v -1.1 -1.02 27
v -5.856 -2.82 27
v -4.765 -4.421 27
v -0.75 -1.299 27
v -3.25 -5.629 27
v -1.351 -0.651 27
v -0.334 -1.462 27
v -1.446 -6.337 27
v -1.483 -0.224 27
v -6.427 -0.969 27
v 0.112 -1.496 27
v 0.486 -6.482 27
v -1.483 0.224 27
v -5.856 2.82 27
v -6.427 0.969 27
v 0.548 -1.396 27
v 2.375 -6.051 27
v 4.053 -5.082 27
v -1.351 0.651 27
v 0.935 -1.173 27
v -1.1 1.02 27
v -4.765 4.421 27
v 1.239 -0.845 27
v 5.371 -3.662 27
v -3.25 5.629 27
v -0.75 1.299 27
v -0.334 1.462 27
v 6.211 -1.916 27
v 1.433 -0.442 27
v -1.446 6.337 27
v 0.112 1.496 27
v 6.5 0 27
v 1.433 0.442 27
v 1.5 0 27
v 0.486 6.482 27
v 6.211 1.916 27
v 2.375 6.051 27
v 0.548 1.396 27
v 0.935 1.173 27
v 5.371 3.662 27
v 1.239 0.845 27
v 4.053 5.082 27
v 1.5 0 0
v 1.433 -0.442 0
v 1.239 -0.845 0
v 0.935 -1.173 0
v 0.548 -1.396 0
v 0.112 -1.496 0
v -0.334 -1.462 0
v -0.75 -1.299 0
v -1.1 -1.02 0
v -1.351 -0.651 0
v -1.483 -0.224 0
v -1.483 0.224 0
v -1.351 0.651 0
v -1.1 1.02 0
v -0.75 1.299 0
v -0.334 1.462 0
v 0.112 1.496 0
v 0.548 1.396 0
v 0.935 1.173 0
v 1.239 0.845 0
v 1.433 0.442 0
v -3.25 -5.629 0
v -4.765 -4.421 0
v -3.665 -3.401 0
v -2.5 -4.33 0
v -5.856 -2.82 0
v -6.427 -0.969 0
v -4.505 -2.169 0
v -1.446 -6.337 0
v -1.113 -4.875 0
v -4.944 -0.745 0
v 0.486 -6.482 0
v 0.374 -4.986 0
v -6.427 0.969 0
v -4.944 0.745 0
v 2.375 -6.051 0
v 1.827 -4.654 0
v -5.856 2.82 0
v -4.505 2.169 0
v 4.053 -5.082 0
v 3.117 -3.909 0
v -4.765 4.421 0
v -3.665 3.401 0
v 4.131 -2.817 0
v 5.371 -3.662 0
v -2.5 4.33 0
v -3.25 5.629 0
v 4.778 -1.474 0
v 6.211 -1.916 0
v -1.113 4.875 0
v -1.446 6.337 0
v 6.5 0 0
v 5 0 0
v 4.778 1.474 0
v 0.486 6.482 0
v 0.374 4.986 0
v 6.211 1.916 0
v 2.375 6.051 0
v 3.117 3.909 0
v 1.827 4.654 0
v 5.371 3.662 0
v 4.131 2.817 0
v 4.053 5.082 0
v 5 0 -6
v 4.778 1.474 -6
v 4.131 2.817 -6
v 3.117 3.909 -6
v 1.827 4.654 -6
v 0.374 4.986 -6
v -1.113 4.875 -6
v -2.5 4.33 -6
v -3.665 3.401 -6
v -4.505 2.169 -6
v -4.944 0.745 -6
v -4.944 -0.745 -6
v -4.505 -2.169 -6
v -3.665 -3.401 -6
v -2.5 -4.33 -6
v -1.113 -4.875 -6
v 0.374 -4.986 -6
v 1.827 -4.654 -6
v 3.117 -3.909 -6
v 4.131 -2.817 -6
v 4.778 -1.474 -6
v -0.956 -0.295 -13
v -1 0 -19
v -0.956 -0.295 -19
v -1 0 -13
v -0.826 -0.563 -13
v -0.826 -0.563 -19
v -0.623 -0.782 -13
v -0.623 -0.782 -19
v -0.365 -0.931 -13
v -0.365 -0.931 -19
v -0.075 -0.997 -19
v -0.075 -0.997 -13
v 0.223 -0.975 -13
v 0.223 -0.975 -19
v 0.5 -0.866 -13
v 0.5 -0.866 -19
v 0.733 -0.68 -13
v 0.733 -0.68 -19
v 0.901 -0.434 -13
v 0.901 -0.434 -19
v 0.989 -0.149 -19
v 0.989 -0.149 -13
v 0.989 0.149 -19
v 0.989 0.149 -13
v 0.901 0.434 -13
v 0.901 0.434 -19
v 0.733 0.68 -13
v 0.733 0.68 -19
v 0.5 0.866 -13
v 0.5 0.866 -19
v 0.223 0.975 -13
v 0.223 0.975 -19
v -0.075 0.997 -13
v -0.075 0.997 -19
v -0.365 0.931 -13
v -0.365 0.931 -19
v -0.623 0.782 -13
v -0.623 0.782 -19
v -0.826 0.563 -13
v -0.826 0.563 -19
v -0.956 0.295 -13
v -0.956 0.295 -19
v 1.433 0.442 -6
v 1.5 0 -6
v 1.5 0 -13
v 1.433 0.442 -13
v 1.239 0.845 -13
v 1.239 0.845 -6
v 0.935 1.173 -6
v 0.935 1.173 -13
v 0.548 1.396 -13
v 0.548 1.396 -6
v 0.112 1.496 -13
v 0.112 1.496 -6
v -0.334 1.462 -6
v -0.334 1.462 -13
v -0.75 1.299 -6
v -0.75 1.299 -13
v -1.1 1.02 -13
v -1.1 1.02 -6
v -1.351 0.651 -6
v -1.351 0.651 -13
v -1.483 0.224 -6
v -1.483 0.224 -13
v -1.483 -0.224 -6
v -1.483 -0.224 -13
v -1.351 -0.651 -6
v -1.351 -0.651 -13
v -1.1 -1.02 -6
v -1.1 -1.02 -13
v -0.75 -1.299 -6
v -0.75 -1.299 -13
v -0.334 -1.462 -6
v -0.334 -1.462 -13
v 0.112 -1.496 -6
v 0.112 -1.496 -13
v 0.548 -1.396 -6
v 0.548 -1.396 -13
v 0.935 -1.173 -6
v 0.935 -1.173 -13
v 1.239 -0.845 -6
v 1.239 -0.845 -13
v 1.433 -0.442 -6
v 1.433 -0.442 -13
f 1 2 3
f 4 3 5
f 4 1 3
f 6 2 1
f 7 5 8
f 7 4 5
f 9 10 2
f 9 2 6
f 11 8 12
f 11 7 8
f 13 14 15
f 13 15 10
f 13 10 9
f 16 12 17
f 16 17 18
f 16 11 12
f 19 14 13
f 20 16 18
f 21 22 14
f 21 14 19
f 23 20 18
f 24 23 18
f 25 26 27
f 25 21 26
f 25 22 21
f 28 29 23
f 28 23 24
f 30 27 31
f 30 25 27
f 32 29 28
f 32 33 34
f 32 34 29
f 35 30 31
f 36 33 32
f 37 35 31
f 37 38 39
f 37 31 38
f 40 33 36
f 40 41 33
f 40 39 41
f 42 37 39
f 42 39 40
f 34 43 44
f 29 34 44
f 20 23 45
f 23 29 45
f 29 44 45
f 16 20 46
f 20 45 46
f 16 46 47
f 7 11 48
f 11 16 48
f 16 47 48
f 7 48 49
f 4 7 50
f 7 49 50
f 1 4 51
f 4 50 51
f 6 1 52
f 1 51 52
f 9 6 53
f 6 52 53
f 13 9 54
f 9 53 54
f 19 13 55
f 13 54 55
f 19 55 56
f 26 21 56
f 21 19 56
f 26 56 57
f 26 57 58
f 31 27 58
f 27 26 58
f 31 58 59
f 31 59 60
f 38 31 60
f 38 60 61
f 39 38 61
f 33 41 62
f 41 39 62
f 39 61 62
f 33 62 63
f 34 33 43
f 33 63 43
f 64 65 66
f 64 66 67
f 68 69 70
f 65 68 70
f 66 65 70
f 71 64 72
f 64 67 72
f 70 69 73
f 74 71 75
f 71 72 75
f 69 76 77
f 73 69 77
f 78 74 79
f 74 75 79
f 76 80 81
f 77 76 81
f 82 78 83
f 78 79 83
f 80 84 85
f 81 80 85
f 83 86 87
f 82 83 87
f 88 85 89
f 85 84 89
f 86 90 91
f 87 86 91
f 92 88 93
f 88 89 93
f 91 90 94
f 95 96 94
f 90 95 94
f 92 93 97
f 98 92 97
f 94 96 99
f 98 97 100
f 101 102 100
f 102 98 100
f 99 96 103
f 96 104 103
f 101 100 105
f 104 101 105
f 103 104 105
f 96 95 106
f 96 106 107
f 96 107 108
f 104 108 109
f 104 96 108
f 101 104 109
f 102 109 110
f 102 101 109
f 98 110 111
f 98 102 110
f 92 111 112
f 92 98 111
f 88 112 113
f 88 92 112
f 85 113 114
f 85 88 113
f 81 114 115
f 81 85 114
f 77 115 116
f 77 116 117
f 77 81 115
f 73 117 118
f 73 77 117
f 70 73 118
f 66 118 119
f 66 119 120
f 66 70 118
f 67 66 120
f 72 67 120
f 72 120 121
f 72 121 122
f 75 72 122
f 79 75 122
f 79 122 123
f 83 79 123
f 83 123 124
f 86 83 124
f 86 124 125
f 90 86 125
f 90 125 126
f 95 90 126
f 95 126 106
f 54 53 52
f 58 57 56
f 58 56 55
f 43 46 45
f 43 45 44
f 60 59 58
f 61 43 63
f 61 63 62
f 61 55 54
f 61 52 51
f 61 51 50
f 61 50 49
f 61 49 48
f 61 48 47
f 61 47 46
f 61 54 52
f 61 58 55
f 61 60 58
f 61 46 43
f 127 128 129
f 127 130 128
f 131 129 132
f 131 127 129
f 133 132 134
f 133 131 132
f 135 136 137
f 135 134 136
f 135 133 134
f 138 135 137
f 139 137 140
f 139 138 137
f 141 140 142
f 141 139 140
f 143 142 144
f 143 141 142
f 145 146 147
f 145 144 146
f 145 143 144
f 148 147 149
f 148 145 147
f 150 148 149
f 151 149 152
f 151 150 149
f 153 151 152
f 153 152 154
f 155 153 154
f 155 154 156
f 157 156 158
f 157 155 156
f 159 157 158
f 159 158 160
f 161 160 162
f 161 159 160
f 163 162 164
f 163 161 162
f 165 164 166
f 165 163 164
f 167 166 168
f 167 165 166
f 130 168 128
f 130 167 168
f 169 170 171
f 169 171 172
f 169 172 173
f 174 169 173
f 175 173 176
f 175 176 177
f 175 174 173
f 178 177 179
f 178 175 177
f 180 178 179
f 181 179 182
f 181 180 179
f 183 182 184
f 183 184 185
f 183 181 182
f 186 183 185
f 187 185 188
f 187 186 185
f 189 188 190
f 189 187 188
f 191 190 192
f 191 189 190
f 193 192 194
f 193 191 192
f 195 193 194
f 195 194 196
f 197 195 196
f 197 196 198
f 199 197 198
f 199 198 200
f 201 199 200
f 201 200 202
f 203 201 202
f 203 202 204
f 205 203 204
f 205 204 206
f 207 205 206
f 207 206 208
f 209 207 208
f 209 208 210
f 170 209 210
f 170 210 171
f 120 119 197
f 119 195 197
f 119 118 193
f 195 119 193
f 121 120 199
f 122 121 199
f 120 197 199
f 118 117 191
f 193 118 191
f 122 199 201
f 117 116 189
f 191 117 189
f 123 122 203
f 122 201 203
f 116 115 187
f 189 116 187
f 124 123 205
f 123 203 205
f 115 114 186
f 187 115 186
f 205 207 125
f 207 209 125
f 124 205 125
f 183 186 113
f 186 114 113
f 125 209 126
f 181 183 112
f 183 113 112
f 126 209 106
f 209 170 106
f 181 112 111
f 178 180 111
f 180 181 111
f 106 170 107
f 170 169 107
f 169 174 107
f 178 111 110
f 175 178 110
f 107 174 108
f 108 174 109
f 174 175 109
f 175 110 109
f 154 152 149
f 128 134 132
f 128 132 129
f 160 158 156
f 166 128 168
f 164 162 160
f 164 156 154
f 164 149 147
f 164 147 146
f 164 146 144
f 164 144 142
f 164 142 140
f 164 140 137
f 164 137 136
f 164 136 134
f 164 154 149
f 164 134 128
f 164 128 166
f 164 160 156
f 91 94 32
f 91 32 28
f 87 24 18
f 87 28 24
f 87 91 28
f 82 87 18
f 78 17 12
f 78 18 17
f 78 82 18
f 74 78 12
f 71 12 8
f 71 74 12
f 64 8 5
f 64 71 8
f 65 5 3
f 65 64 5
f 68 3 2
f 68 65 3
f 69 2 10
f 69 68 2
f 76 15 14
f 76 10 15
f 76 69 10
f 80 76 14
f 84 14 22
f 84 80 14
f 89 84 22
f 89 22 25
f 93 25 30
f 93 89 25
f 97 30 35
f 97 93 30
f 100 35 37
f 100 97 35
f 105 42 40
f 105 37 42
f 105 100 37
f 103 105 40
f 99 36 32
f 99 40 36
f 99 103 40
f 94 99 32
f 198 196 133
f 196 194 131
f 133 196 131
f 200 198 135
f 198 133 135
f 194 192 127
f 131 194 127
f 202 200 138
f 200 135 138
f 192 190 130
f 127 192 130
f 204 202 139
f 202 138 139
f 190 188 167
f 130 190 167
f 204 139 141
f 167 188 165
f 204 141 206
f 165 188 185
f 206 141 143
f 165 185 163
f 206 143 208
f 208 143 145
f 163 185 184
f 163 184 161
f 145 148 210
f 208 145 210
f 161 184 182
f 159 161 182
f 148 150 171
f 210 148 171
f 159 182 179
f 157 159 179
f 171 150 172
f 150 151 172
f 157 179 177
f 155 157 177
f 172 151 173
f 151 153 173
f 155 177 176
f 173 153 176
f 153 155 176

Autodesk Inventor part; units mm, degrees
ref_plane "YZ Plane" through (0, 0, 0) normal (1, 0, 0) x (0, 1, 0)
ref_plane "XZ Plane" through (0, 0, 0) normal (0, 1, 0) x (-1, 0, 0)
ref_plane "XY Plane" through (0, 0, 0) normal (0, 0, 1) x (1, 0, 0)
sketch "Sketch1" plane through (0, 0, 0) normal (0, 0, 1) x (1, 0, 0)
  circle A0 centre (0, 0) radius 6.5
  circle A1 centre (0, 0) radius 5
  circle A2 centre (0, 0) radius 1.5
  dimension "d11" = 13
  dimension "d12" = 10
  dimension "d13" = 3
extrude "Extrusion1" add sketch "Sketch1" along normal blind 27 contours A0 | A1
extrude "Extrusion3" add sketch "Sketch1" against normal blind 6 contours A1
extrude "Extrusion4" add sketch "Sketch1" against normal blind 13 contours A2
sketch "Sketch3" plane through (0, 0, -13) normal (0, 0, -1) x (-1, 0, 0)
  circle A0 centre (0, 0) radius 1
  dimension "d18" = 2
extrude "Extrusion5" add sketch "Sketch3" along normal blind 6
properties part number "Solinoid"
